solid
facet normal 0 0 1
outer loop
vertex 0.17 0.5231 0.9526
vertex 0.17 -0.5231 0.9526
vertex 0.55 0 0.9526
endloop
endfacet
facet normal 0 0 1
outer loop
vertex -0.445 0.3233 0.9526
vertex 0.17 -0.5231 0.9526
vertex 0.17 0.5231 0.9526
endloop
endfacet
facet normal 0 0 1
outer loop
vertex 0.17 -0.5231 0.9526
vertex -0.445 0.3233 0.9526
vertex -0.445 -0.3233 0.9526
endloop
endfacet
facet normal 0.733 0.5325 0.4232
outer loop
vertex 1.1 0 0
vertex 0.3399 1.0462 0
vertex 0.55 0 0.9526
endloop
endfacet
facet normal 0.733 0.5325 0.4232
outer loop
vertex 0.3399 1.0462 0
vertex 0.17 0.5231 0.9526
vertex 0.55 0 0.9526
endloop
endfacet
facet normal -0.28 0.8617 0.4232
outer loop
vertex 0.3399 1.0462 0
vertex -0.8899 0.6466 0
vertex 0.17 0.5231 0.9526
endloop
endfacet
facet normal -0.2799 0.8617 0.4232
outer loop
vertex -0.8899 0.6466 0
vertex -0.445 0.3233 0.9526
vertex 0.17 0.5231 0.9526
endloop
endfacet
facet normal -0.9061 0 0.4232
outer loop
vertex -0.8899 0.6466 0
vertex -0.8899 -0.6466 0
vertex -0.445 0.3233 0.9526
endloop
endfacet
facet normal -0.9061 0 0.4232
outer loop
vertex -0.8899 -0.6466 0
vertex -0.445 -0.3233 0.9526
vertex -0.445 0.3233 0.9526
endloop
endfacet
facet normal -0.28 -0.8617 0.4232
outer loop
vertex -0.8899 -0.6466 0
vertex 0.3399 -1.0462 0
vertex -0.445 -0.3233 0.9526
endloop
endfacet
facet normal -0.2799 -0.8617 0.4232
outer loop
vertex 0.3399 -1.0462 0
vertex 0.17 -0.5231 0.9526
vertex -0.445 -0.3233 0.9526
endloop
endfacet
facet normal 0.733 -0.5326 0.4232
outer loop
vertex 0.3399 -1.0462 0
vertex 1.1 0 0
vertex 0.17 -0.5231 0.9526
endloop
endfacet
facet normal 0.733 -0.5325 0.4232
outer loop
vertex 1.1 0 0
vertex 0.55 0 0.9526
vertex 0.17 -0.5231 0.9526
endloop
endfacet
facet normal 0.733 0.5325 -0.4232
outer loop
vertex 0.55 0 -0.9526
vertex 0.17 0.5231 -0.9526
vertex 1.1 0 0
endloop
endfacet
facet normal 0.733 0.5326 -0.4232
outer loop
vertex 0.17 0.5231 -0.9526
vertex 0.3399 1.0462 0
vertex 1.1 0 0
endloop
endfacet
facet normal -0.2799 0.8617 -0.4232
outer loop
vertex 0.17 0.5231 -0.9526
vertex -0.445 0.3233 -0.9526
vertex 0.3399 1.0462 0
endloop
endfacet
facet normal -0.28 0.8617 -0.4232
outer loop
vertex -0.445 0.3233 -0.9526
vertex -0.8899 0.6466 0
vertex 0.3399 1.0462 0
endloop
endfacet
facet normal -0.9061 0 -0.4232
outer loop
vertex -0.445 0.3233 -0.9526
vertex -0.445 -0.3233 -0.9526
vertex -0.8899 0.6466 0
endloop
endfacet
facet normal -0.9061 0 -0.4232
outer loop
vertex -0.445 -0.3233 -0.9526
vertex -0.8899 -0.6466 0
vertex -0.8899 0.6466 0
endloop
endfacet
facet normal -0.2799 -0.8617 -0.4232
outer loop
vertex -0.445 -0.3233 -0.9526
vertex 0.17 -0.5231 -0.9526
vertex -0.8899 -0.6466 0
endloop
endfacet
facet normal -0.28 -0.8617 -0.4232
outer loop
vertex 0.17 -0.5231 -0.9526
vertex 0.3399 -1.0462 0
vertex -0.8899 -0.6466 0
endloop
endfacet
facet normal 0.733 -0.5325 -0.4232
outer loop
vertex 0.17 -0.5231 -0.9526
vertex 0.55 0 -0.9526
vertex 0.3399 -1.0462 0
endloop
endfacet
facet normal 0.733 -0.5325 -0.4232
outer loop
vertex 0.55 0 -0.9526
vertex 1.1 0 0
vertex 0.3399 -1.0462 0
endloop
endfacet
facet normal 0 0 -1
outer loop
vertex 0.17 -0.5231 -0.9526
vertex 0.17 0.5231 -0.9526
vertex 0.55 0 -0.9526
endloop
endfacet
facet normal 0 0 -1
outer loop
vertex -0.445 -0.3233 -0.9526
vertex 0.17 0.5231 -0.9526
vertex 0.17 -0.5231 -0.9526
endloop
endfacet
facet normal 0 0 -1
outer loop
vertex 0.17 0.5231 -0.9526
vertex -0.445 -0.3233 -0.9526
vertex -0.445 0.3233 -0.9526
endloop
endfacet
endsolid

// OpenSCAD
// This next one is a real beauty.
sphere(r=1.1);

// Ain’t it?
